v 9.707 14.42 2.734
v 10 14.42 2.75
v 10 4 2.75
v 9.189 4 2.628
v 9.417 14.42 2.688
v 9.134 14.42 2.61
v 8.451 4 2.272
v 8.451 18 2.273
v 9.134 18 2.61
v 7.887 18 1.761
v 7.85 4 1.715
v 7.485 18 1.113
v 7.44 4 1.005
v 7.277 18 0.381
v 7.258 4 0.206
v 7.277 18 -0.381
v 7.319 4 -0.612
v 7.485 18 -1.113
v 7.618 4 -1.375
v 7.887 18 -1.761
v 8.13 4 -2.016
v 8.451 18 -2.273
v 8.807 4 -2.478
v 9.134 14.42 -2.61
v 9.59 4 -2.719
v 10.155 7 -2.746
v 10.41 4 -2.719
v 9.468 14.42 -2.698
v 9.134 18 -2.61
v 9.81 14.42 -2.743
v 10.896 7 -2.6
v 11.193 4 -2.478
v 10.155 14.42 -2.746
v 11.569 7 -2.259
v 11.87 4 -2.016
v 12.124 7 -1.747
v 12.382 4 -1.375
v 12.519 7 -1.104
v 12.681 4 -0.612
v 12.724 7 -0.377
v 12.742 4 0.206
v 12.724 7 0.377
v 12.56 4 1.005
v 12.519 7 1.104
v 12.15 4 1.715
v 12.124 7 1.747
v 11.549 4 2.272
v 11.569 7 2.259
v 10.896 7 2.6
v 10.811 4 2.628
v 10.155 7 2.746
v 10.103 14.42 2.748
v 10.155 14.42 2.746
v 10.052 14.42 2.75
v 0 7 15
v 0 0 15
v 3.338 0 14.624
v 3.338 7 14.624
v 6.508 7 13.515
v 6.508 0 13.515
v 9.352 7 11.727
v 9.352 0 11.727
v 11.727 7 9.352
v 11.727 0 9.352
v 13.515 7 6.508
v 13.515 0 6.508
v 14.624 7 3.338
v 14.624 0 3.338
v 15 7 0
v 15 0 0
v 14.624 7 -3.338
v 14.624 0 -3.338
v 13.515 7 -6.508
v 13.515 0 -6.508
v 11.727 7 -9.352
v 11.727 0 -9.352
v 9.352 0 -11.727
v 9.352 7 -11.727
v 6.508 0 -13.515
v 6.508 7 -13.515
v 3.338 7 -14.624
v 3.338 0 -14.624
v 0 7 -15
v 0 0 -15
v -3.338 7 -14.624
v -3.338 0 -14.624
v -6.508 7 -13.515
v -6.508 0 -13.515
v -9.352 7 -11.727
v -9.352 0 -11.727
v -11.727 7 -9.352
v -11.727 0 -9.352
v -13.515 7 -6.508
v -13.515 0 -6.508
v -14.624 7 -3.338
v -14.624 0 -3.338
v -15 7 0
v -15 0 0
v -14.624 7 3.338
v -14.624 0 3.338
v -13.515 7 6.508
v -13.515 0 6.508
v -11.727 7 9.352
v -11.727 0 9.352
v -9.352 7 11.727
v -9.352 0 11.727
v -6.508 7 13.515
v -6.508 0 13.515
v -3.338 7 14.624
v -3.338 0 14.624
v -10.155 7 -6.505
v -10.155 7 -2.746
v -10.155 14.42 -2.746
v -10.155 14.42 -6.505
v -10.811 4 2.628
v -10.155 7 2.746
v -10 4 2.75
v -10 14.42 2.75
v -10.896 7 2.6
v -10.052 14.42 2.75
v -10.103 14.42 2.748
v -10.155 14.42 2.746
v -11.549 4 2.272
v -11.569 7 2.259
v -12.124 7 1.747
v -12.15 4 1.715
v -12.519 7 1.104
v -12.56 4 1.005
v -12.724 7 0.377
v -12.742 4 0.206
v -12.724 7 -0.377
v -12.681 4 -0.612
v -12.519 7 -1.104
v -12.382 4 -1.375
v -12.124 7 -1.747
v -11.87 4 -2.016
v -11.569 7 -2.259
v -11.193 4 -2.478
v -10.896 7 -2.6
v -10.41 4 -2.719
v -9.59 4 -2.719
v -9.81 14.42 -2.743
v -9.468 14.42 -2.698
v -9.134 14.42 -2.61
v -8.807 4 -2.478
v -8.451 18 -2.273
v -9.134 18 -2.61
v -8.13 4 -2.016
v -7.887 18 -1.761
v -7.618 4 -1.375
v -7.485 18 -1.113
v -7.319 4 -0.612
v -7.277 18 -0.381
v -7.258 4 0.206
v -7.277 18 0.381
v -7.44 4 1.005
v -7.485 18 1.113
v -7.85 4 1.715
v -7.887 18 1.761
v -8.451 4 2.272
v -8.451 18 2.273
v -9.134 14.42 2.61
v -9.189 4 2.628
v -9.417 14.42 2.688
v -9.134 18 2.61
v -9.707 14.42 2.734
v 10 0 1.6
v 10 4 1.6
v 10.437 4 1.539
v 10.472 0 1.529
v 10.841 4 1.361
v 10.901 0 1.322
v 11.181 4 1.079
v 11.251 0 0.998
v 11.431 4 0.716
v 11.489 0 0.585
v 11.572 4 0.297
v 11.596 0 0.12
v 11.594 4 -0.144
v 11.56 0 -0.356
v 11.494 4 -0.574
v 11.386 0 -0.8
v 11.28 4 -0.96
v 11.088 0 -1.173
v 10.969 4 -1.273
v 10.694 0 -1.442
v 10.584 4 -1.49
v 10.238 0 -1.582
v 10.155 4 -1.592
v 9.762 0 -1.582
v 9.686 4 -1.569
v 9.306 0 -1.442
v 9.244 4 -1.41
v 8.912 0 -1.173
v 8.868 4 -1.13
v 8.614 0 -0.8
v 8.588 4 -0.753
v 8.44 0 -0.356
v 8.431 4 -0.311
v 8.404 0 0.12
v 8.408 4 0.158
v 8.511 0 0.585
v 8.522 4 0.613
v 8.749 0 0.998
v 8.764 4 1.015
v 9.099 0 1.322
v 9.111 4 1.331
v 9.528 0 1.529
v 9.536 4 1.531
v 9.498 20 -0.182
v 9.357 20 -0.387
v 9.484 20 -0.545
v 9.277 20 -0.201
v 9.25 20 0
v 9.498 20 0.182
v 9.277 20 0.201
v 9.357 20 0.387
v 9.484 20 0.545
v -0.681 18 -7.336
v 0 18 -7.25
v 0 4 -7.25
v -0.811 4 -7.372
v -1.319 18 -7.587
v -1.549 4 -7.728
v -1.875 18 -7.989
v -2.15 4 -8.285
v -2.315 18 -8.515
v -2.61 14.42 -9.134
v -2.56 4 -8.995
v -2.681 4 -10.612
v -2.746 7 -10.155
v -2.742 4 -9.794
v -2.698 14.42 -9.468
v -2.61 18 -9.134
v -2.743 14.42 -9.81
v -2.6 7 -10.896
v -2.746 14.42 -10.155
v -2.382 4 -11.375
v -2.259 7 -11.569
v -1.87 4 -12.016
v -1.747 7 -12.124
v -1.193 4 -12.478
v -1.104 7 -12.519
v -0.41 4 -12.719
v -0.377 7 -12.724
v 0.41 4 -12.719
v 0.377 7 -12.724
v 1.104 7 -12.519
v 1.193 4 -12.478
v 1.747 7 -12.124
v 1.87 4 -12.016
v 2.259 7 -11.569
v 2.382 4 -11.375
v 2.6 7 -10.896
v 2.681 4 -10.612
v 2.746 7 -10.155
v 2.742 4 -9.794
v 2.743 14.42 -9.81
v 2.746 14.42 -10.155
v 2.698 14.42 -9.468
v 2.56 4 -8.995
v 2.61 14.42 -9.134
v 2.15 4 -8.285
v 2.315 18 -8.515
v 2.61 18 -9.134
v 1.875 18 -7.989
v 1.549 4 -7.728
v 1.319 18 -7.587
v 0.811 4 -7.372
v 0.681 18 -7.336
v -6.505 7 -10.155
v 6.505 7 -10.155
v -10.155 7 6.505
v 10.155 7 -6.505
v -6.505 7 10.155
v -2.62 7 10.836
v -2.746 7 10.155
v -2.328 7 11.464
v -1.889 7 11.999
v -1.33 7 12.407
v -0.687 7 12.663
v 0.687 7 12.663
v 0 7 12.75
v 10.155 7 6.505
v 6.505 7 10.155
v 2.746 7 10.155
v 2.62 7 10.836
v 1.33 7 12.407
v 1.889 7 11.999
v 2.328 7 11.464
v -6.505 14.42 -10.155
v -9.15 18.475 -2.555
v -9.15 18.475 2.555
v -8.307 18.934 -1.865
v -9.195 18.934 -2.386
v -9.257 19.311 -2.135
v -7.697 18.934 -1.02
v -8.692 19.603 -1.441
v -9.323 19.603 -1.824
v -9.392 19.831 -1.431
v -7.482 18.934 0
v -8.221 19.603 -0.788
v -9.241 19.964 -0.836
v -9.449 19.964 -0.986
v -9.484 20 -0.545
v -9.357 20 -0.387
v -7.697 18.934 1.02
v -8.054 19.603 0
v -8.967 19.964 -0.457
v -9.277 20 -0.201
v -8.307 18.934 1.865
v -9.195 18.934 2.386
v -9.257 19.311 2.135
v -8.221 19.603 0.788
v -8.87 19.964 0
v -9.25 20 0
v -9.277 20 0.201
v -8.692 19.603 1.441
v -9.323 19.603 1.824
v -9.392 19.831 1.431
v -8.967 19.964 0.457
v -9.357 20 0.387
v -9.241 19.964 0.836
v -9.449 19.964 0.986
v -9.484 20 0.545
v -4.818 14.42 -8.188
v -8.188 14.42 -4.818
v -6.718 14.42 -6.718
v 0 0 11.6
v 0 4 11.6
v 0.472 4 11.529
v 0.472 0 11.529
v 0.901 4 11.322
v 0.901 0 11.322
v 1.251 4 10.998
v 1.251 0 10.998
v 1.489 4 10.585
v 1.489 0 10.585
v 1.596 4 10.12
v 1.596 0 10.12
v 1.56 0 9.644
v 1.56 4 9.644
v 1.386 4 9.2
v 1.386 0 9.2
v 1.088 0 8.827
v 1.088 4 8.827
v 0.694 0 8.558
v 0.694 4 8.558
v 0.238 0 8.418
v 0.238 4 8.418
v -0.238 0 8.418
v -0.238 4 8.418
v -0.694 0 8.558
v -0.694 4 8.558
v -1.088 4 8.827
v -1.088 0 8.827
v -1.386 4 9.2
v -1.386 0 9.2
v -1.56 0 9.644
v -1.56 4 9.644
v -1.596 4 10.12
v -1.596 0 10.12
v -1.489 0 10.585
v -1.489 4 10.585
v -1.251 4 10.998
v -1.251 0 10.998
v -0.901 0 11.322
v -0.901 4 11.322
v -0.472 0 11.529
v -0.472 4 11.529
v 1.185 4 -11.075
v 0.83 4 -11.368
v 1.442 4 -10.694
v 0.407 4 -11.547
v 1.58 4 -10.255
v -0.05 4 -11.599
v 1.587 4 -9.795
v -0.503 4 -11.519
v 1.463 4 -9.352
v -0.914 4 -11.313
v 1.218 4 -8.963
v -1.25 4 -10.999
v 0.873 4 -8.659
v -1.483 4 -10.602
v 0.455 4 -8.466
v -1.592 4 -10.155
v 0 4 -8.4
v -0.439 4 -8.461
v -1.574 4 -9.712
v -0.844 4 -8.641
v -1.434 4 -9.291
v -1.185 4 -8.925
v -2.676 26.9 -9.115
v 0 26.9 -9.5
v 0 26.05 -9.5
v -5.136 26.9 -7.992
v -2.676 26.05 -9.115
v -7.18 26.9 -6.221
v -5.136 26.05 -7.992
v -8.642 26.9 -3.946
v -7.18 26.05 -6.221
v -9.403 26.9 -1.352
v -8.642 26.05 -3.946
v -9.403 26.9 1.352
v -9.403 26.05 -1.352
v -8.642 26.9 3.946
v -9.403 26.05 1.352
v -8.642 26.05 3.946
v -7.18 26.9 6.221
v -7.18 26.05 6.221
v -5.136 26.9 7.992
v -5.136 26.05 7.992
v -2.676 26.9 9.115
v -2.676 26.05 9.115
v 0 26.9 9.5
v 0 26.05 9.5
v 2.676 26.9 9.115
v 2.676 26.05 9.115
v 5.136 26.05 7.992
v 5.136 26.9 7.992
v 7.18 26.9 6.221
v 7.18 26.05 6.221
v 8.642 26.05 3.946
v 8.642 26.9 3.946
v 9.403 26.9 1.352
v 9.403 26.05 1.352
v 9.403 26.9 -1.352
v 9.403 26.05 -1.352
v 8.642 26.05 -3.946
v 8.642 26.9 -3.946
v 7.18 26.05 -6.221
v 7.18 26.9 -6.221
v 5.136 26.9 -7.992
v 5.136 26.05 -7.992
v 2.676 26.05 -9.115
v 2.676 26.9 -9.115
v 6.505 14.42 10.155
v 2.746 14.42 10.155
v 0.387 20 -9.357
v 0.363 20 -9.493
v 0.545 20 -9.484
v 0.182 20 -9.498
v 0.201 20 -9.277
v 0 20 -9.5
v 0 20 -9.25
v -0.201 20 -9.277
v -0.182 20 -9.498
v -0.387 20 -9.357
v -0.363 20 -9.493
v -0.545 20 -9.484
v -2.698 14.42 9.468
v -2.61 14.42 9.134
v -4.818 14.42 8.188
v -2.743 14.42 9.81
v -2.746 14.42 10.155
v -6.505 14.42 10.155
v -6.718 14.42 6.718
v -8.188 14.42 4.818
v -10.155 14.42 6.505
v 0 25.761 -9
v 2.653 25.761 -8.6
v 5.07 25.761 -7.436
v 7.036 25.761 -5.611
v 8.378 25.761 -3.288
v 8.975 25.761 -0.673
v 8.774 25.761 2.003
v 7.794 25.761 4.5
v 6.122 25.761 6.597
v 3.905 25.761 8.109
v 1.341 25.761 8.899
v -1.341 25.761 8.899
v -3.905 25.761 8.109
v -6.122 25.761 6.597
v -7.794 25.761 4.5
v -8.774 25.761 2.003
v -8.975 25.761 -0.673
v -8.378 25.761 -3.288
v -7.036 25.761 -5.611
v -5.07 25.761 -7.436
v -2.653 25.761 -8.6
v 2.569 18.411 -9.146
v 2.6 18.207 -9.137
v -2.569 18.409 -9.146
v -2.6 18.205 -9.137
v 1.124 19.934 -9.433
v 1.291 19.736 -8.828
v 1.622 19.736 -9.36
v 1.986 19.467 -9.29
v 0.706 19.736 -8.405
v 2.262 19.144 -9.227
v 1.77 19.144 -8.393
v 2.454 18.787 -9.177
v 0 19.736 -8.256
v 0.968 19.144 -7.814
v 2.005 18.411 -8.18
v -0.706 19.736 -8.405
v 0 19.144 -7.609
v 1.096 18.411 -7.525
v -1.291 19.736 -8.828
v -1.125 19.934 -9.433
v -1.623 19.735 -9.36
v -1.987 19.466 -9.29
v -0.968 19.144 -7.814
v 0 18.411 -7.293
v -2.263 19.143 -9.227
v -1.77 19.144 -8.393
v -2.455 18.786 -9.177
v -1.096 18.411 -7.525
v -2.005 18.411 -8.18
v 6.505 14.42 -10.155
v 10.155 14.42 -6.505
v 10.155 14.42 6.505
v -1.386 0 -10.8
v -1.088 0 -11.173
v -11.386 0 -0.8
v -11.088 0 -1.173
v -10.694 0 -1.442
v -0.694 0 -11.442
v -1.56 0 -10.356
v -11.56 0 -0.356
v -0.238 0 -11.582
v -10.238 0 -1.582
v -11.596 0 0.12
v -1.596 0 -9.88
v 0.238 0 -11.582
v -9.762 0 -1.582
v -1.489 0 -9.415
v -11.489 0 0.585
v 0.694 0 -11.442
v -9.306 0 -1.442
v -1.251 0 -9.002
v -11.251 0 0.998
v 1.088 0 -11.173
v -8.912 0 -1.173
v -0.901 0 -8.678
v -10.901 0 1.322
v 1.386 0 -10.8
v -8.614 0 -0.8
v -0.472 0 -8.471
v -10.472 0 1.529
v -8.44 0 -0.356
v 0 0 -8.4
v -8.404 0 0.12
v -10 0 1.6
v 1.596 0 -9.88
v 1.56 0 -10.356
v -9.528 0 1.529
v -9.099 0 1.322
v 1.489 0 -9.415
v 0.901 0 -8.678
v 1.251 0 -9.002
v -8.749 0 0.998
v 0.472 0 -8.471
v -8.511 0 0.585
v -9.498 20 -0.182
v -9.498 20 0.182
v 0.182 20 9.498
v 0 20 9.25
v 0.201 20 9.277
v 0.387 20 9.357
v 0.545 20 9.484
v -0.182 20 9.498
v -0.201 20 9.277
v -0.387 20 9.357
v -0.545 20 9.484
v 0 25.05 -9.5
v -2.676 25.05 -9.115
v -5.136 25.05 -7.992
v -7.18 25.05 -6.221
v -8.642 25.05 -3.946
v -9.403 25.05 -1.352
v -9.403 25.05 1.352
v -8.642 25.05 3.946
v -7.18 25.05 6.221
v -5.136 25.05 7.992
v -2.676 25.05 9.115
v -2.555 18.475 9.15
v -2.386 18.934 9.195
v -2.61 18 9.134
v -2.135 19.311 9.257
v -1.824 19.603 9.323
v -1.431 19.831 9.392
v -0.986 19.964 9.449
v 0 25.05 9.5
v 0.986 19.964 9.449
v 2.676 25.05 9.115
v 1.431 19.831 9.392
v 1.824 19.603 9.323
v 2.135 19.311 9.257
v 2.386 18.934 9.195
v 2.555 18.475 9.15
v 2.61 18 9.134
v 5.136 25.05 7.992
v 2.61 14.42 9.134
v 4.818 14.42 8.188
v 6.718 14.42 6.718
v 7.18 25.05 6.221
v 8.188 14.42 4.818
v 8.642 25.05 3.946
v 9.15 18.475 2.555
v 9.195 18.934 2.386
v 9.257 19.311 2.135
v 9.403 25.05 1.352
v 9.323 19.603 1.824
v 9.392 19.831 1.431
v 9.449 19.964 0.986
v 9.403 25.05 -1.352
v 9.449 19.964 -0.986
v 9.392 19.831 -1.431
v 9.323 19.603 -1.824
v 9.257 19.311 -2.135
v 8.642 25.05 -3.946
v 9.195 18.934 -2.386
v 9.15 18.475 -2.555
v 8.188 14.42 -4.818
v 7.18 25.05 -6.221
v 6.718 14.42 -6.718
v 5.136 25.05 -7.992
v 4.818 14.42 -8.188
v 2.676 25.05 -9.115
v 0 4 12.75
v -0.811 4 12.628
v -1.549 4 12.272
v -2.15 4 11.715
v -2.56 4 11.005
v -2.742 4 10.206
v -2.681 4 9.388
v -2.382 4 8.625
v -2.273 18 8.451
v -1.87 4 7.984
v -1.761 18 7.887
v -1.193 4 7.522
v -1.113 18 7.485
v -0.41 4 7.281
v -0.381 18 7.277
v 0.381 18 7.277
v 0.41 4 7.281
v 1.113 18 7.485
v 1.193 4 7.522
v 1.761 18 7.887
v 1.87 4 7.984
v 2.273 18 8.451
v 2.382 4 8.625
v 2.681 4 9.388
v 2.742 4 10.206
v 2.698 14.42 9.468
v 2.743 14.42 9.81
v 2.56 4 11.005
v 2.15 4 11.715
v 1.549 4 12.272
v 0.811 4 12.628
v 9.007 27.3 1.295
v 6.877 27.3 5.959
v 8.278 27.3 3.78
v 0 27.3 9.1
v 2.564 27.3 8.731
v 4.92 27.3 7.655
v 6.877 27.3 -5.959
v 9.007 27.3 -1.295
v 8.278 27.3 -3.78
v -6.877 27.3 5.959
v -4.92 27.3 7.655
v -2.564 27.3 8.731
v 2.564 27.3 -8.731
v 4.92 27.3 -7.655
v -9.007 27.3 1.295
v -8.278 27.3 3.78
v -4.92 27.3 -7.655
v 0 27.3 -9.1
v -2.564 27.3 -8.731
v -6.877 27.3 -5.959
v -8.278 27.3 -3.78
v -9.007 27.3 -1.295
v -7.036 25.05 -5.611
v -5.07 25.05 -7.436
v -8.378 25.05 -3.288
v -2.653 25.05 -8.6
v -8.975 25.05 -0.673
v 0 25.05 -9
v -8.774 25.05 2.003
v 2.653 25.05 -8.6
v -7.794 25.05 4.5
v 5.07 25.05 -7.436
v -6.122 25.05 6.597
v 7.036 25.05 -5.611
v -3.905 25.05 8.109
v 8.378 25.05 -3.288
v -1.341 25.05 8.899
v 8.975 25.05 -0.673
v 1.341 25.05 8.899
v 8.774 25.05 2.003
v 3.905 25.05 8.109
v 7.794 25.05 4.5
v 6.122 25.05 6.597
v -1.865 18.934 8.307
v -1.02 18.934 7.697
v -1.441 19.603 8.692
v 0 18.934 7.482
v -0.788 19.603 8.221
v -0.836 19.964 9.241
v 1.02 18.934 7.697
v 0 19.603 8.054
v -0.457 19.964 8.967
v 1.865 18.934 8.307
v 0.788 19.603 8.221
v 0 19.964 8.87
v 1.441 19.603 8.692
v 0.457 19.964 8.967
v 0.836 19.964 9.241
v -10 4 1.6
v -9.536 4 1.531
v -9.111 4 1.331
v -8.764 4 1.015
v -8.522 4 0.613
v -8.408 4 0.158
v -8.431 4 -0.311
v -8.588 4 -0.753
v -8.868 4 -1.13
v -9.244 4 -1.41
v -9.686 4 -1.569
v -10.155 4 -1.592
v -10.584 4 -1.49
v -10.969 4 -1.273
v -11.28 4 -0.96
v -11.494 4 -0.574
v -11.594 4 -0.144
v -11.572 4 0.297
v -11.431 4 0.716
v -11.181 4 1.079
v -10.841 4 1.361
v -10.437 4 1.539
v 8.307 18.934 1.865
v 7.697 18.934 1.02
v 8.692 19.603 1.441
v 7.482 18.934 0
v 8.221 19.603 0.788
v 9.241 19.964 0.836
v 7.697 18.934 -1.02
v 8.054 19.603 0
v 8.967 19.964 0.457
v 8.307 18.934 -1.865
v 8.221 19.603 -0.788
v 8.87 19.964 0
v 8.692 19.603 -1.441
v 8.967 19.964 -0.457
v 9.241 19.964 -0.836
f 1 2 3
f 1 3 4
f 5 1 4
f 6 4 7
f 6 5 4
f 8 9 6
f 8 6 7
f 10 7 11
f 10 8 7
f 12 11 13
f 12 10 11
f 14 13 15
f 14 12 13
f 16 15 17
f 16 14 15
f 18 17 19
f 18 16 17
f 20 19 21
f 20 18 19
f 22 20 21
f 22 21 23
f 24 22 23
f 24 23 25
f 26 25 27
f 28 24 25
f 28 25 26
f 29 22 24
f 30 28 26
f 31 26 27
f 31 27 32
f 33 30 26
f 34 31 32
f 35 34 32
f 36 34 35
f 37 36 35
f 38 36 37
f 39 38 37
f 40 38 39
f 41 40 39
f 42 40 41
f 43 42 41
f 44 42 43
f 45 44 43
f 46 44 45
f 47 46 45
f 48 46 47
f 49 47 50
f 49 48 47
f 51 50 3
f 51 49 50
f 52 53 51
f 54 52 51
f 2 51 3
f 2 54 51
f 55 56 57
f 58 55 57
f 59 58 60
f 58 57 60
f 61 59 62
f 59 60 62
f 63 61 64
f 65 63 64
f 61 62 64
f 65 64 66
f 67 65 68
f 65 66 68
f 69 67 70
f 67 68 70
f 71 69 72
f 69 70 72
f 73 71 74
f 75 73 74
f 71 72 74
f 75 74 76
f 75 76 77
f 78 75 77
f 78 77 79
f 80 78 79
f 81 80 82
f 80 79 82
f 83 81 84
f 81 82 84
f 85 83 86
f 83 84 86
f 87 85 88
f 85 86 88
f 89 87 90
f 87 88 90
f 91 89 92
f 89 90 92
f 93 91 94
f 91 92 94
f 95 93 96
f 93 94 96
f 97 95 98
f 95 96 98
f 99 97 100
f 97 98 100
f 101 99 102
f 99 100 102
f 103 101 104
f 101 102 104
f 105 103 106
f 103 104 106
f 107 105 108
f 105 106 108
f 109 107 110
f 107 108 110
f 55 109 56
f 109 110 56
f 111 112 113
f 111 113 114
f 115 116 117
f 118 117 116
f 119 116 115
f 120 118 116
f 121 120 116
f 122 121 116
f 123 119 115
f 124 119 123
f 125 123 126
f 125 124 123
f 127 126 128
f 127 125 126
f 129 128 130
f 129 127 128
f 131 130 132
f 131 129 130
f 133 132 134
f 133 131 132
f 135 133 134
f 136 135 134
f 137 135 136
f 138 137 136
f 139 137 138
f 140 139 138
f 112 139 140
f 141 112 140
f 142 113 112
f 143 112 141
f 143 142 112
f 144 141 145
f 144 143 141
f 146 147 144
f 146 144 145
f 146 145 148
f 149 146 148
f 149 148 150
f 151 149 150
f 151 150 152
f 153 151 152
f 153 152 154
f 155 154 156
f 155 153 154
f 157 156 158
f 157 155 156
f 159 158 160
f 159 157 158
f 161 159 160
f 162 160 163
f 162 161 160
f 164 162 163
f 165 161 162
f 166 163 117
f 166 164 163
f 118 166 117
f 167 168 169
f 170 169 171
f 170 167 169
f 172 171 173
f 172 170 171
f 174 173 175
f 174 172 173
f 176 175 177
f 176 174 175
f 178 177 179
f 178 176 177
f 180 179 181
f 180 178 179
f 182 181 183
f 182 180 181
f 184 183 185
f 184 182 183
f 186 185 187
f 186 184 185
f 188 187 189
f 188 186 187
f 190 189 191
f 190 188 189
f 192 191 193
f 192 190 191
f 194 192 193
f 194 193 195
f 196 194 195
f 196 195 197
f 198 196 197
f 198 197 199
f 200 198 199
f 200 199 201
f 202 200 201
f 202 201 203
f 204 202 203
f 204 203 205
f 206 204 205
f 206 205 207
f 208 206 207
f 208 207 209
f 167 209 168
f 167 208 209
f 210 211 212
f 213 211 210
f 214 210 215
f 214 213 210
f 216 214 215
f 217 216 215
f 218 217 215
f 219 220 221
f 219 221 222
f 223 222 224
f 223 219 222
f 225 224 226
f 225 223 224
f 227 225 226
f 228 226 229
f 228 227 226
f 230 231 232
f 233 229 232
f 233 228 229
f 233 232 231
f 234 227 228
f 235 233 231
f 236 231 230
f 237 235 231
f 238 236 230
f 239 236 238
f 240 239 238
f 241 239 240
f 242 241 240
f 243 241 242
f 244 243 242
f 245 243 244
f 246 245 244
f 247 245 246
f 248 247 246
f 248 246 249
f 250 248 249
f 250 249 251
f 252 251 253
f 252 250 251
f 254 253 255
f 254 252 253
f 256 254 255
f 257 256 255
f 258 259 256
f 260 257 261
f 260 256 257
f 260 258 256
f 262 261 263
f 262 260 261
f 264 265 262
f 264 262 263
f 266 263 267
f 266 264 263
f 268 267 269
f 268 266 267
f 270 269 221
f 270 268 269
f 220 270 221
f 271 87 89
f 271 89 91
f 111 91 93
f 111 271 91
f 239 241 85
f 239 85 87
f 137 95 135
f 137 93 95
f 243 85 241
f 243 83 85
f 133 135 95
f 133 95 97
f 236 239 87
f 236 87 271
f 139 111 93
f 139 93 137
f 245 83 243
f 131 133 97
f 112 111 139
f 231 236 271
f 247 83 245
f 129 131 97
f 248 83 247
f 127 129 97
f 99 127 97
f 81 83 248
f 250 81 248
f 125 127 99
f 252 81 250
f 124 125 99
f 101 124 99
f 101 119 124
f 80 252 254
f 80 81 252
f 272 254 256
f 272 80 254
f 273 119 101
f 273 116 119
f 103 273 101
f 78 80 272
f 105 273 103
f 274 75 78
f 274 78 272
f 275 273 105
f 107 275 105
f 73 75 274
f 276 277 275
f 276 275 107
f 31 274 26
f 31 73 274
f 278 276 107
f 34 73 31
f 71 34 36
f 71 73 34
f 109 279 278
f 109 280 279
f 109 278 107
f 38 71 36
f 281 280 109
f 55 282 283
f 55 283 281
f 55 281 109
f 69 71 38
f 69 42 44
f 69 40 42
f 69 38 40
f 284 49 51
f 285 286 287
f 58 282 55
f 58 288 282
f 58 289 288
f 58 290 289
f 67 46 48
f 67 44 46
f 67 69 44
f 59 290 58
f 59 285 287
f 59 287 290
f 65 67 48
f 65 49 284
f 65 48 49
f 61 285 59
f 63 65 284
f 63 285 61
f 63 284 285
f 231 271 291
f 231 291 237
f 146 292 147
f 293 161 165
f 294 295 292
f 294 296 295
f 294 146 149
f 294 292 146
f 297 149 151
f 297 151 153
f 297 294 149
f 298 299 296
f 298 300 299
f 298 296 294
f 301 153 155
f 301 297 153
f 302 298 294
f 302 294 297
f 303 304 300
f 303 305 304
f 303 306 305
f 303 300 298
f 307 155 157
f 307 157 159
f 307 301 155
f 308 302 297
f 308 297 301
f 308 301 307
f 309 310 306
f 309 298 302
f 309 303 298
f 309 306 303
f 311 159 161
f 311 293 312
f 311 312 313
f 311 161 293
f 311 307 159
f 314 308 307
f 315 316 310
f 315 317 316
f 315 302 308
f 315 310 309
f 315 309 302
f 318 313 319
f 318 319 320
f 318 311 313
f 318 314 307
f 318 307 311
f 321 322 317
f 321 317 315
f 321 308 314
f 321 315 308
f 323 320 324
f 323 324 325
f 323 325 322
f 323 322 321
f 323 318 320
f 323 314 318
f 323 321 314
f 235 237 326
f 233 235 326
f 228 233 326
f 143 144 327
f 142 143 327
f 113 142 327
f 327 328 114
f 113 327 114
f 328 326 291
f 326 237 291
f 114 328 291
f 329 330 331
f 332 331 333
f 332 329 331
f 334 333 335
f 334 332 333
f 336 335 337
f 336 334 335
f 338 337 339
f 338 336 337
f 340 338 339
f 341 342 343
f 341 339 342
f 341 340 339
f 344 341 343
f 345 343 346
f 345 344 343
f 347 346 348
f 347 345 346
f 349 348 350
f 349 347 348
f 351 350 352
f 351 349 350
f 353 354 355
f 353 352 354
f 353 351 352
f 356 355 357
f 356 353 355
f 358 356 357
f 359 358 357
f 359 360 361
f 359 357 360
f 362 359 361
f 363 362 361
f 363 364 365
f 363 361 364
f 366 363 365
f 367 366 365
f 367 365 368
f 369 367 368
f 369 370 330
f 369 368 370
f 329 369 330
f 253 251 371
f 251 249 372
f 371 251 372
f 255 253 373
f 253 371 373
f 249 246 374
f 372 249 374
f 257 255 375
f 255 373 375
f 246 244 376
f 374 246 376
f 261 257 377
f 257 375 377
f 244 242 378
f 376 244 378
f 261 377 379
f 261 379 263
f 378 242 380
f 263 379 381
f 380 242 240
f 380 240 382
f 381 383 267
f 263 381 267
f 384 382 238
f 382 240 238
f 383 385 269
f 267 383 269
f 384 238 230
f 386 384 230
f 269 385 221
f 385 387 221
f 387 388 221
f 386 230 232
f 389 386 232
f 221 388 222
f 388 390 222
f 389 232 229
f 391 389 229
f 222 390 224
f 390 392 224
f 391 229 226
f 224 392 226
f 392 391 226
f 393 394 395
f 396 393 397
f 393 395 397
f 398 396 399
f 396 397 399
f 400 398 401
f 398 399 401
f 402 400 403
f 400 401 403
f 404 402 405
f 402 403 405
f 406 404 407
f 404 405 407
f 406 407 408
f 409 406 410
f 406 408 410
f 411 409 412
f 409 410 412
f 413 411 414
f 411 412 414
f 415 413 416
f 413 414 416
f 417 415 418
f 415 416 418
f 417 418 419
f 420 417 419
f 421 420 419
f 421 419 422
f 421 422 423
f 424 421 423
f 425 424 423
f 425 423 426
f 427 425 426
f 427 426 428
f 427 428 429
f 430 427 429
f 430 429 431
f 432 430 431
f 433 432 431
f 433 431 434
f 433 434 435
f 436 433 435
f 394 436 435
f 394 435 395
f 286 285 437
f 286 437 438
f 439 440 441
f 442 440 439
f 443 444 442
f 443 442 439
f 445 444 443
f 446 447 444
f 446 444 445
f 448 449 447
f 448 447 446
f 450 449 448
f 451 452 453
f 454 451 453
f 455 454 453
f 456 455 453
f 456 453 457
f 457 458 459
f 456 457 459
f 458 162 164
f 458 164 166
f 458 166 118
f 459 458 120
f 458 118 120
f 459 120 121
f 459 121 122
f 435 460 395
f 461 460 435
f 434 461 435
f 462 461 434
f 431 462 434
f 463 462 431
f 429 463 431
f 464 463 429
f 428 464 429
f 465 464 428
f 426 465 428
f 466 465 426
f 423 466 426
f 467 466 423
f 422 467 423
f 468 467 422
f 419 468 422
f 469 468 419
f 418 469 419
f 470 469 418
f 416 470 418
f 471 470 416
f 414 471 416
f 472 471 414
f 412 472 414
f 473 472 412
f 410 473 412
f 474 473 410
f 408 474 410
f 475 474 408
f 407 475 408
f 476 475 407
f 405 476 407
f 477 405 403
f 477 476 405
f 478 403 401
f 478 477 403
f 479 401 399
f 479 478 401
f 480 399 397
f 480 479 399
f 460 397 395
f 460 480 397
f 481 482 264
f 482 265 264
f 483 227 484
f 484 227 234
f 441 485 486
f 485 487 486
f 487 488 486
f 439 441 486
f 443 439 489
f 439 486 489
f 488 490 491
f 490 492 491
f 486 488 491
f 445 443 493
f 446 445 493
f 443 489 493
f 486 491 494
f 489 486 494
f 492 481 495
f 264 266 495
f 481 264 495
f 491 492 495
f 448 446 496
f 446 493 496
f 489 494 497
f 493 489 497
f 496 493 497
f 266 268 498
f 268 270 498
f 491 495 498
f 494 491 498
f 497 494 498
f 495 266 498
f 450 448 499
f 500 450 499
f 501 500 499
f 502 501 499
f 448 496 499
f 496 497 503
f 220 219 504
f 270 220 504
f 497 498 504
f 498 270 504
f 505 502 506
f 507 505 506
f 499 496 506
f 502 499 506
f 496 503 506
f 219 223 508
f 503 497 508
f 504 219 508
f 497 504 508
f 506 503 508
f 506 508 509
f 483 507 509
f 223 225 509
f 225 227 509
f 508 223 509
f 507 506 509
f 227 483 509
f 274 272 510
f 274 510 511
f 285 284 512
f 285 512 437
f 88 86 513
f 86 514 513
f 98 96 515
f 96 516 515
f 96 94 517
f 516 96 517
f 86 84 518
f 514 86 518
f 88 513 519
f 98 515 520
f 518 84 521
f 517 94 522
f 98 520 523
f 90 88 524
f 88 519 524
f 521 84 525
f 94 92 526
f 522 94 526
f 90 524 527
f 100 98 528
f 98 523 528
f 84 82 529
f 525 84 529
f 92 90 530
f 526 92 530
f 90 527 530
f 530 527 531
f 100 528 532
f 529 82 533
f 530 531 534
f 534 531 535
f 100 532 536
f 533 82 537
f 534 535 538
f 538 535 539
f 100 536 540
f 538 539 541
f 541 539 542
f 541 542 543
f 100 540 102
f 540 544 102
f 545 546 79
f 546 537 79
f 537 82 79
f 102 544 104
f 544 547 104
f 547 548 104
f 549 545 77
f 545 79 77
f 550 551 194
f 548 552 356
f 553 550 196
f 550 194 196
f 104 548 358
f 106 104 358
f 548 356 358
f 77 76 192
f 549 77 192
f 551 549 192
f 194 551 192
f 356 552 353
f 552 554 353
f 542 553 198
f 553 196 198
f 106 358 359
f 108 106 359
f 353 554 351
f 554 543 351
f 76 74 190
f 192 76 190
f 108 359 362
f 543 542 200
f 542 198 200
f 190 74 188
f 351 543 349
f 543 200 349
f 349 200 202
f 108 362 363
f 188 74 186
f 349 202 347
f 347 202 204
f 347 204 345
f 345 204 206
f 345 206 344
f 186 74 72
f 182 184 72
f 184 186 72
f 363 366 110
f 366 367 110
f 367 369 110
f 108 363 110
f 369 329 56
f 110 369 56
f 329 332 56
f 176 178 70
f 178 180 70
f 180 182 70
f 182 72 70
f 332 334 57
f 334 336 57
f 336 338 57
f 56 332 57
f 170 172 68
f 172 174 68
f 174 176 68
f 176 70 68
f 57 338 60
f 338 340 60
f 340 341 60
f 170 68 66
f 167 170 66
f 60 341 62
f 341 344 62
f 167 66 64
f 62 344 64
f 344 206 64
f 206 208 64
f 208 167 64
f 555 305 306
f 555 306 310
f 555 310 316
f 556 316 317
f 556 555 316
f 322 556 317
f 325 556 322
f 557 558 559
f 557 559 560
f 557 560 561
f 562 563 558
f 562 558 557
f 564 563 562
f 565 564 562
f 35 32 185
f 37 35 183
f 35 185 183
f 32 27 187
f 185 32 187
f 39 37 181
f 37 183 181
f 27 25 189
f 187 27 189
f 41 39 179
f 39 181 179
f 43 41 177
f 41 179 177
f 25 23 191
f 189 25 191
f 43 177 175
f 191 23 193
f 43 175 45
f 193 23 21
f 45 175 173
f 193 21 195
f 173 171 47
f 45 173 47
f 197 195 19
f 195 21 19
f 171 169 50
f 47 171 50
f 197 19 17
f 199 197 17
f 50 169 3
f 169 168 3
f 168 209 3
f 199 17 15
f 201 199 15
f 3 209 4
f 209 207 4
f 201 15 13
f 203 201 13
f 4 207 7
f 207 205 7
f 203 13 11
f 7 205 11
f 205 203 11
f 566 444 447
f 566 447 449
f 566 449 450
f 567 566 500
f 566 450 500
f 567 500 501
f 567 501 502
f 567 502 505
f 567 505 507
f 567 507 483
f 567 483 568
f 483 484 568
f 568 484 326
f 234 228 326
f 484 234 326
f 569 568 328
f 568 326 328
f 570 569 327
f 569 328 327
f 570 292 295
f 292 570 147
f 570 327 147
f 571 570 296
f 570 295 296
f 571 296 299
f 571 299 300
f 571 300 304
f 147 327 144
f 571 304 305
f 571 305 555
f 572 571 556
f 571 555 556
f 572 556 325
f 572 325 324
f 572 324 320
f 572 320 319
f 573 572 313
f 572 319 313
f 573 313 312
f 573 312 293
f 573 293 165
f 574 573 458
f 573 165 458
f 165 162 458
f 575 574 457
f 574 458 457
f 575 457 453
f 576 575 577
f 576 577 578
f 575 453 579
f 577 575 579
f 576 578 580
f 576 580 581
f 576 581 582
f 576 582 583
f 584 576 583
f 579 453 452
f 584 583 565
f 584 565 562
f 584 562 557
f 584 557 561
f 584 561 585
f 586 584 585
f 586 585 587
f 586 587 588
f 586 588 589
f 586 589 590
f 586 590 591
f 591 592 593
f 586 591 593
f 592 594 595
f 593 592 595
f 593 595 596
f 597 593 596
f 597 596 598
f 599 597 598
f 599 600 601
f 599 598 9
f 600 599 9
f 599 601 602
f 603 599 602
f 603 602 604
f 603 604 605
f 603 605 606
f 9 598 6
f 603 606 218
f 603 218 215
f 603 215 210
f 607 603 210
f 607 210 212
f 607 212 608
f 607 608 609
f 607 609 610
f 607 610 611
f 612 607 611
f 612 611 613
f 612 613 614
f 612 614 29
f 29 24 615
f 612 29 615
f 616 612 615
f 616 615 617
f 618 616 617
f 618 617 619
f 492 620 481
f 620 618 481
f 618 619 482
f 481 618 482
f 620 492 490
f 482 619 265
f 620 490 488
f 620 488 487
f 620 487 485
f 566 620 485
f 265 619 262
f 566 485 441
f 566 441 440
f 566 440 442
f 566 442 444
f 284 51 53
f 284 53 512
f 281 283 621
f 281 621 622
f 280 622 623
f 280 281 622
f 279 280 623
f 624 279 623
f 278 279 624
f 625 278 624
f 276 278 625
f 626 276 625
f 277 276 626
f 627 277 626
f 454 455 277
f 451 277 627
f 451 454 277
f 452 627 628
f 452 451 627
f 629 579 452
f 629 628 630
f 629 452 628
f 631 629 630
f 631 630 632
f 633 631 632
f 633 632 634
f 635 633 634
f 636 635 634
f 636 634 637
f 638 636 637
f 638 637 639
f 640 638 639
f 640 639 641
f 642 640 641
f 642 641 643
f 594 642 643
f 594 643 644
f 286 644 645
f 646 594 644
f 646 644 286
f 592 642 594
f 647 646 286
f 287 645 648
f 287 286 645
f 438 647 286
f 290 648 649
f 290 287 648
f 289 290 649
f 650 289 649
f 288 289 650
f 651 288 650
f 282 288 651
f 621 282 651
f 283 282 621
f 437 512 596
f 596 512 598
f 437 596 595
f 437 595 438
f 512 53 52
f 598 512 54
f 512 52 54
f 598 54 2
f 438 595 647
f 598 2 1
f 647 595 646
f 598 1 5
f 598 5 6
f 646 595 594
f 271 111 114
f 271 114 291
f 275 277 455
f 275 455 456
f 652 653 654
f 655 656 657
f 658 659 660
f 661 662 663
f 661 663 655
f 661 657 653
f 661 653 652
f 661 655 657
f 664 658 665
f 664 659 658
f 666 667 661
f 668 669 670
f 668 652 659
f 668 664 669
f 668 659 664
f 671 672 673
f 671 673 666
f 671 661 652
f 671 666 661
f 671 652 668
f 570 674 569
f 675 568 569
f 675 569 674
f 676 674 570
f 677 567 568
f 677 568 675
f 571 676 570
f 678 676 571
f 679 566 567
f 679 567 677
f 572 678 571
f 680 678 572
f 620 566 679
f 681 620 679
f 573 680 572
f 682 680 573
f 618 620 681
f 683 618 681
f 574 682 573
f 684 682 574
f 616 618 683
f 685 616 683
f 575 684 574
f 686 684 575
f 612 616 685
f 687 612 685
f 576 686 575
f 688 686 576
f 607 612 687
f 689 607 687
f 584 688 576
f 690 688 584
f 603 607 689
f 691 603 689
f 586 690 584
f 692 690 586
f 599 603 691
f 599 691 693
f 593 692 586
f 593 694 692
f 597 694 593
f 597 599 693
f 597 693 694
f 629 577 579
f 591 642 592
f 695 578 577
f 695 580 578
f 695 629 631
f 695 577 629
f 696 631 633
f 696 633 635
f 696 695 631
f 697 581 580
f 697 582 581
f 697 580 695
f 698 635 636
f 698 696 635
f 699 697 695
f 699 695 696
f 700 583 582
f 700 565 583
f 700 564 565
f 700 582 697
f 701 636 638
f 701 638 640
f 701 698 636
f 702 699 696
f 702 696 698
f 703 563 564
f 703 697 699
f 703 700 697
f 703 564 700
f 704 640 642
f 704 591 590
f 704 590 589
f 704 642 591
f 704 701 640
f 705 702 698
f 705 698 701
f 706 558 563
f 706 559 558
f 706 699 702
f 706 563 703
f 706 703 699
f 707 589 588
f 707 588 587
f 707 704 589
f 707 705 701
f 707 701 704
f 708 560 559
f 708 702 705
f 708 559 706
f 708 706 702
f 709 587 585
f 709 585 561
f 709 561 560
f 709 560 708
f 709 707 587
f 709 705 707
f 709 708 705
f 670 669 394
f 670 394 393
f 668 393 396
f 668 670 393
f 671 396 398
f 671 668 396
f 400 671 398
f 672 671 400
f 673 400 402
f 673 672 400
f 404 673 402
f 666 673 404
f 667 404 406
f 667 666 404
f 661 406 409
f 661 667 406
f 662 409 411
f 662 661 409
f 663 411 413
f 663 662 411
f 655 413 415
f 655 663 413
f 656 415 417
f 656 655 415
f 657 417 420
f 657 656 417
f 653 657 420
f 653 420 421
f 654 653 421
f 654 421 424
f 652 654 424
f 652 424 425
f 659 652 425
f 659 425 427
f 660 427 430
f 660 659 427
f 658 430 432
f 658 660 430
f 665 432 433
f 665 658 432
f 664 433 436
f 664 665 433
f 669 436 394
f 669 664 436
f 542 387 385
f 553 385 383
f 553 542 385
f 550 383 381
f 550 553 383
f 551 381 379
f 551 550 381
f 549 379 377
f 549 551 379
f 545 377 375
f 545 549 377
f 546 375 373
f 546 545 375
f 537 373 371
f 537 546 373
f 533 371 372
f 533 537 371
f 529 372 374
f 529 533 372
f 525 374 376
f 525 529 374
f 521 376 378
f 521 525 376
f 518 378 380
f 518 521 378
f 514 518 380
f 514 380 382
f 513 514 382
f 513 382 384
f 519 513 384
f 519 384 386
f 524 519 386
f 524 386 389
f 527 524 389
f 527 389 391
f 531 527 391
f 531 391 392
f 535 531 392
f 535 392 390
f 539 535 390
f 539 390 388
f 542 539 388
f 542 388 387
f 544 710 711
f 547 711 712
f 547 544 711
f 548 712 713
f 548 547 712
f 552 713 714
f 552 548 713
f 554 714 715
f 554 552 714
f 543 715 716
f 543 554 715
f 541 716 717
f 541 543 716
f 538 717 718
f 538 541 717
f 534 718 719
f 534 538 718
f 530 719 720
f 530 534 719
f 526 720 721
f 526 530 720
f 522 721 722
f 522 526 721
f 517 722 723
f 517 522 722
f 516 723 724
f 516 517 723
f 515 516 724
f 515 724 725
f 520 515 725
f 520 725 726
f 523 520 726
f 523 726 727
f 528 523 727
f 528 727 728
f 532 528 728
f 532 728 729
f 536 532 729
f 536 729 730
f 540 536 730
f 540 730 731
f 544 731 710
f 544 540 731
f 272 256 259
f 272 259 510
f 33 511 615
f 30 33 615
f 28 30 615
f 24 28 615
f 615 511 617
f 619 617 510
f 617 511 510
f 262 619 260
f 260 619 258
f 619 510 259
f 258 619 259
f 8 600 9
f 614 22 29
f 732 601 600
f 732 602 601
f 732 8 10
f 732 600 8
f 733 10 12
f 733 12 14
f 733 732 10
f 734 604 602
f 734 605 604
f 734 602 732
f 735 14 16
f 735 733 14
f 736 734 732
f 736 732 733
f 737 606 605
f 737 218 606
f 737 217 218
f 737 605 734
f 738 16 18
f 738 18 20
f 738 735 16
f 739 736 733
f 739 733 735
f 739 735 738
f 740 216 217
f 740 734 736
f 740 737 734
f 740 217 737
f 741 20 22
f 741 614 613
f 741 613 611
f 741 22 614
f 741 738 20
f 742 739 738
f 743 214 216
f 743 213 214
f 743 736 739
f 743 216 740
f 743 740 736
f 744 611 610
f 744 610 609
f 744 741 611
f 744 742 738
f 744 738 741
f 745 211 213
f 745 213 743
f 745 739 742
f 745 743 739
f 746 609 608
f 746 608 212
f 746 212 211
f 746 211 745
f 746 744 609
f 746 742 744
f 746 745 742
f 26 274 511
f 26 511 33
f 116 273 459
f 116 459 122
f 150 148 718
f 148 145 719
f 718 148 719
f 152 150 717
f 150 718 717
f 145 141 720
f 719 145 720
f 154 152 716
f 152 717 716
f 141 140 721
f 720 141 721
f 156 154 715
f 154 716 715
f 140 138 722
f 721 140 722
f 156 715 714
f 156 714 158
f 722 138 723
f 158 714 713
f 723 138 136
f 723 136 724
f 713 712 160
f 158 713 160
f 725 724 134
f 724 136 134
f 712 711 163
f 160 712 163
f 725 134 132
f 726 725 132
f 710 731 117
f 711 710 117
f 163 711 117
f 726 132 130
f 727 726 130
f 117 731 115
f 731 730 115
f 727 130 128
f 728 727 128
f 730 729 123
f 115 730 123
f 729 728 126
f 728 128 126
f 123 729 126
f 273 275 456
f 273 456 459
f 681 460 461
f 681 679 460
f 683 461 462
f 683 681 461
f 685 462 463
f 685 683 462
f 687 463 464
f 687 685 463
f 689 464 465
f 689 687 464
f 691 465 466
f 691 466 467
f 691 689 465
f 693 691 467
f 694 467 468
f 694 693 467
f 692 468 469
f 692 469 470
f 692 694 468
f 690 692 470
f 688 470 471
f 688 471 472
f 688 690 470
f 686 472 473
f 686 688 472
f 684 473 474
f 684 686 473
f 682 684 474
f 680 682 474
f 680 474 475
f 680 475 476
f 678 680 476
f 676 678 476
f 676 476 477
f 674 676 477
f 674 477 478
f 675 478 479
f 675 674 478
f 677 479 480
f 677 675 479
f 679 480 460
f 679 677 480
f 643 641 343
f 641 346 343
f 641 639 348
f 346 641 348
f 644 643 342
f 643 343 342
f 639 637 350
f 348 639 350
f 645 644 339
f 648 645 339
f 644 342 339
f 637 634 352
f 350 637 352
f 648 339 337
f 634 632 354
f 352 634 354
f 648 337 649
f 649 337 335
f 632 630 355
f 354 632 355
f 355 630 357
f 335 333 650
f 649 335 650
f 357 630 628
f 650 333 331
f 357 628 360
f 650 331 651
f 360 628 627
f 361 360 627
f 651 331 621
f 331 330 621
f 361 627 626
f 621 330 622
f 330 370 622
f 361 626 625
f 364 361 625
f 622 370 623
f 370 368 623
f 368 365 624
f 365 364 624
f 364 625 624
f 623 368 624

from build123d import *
from build123d.topology import SkipClean

# Parameters (mm, degrees)
SKETCH1_R           = 15
SKETCH1_R_2         = 1.6
BOSS_EXTRUDE1_DEPTH = 7
BOSS_EXTRUDE2_DEPTH = 7.42
SKETCH3_R           = 9.5
BOSS_EXTRUDE3_DEPTH = 12.88
SKETCH5_R           = 1.6
CUT_EXTRUDE1_DEPTH  = 20
SKETCH6_R           = 2.75
CUT_EXTRUDE2_DEPTH  = 16
FILLET1_R           = 2
CHAMFER1_SIZE       = 0.4


with BuildPart() as part:
    # Sketch1 → Boss-Extrude1 (new body)
    with BuildSketch(Plane(origin=(0, 0, 0), x_dir=(1, 0, 0), z_dir=(0, 1, 0))):
        with Locations(Location((0, 0, 0), (0, 0, 270))):
            Circle(SKETCH1_R)
        with Locations(Location((0, 10, 0), (0, 0, 270))):
            Circle(SKETCH1_R_2, mode=Mode.SUBTRACT)
        with Locations(Location((0, -10, 0), (0, 0, 270))):
            Circle(SKETCH1_R_2, mode=Mode.SUBTRACT)
        with Locations(Location((10, 0, 0), (0, 0, 270))):
            Circle(SKETCH1_R_2, mode=Mode.SUBTRACT)
        with Locations(Location((-10, 0, 0), (0, 0, 270))):
            Circle(SKETCH1_R_2, mode=Mode.SUBTRACT)
    extrude(amount=BOSS_EXTRUDE1_DEPTH)

    # Sketch2 → Boss-Extrude2 (add)
    with BuildSketch(Plane(origin=(0, 7, 0), x_dir=(1, 0, 0), z_dir=(0, 1, 0))):
        Polygon((-6.505, 10.155), (6.505, 10.155), (10.155, 6.505), (10.155, -6.505), (6.505, -10.155), (-6.505, -10.155), (-10.155, -6.505), (-10.155, 6.505), align=None)
    extrude(amount=BOSS_EXTRUDE2_DEPTH)

    # Sketch3 → Boss-Extrude3 (add)
    with BuildSketch(Plane(origin=(0, 14.42, 0), x_dir=(1, 0, 0), z_dir=(0, 1, 0))):
        with Locations(Location((0, 0, 0), (0, 0, 90))):
            Circle(SKETCH3_R)
    extrude(amount=BOSS_EXTRUDE3_DEPTH)

    # Sketch4 → Cut-Revolve1 (revolve, cut)
    with BuildSketch(Plane.XY, mode=Mode.PRIVATE) as cut_revolve1_sk:
        Polygon((9, 25.05), (10, 25.05), (10, 26.05), (9.5, 26.05), (9, 25.761324865), align=None)
    revolve(cut_revolve1_sk.sketch.rotate(Axis((0, 27.3, 0), (0, -1, 0)), 270), axis=Axis((0, 27.3, 0), (0, -1, 0)), mode=Mode.SUBTRACT)

    # Sketch5 → Cut-Extrude1 (cut)
    with SkipClean():  # the faces are left unmerged after this step: merging them gives an invalid solid
        with BuildSketch(Plane.XZ):
            with Locations(Location((0, -10, 0), (0, 0, 185.559247246))):
                Circle(SKETCH5_R)
            with Locations(Location((10, 0, 0), (0, 0, 275.559247246))):
                Circle(SKETCH5_R)
            with Locations(Location((-10, 0, 0), (0, 0, 264.440752754))):
                Circle(SKETCH5_R)
            with Locations(Location((0, 10, 0), (0, 0, 202.624341254))):
                Circle(SKETCH5_R)
        extrude(amount=-CUT_EXTRUDE1_DEPTH, mode=Mode.SUBTRACT)

    # Sketch6 → Cut-Extrude2 (cut)
    with BuildSketch(Plane.XZ.offset(-20)):
        with Locations(Location((10, 0, 0), (0, 0, 90))):
            Circle(SKETCH6_R)
        with Locations(Location((0, 10, 0), (0, 0, 90))):
            Circle(SKETCH6_R)
        with Locations(Location((-10, 0, 0), (0, 0, 90))):
            Circle(SKETCH6_R)
        with Locations(Location((0, -10, 0), (0, 0, 90))):
            Circle(SKETCH6_R)
    extrude(amount=CUT_EXTRUDE2_DEPTH, mode=Mode.SUBTRACT)

    # Fillet1
    fillet1_edges = [part.edges().sort_by_distance(p)[0] for p in [
        (7.25, 20, 0),
        (0, 20, 7.25),
        (-7.25, 20, 0),
        (-1.609663202, 20, -7.770317427),
    ]]
    fillet(fillet1_edges, radius=FILLET1_R)

    # Chamfer1
    chamfer1_edges = [part.edges().sort_by_distance(p)[0] for p in [
        (0, 27.3, 9.5),
    ]]
    chamfer(chamfer1_edges, length=CHAMFER1_SIZE)


solid = part.part
